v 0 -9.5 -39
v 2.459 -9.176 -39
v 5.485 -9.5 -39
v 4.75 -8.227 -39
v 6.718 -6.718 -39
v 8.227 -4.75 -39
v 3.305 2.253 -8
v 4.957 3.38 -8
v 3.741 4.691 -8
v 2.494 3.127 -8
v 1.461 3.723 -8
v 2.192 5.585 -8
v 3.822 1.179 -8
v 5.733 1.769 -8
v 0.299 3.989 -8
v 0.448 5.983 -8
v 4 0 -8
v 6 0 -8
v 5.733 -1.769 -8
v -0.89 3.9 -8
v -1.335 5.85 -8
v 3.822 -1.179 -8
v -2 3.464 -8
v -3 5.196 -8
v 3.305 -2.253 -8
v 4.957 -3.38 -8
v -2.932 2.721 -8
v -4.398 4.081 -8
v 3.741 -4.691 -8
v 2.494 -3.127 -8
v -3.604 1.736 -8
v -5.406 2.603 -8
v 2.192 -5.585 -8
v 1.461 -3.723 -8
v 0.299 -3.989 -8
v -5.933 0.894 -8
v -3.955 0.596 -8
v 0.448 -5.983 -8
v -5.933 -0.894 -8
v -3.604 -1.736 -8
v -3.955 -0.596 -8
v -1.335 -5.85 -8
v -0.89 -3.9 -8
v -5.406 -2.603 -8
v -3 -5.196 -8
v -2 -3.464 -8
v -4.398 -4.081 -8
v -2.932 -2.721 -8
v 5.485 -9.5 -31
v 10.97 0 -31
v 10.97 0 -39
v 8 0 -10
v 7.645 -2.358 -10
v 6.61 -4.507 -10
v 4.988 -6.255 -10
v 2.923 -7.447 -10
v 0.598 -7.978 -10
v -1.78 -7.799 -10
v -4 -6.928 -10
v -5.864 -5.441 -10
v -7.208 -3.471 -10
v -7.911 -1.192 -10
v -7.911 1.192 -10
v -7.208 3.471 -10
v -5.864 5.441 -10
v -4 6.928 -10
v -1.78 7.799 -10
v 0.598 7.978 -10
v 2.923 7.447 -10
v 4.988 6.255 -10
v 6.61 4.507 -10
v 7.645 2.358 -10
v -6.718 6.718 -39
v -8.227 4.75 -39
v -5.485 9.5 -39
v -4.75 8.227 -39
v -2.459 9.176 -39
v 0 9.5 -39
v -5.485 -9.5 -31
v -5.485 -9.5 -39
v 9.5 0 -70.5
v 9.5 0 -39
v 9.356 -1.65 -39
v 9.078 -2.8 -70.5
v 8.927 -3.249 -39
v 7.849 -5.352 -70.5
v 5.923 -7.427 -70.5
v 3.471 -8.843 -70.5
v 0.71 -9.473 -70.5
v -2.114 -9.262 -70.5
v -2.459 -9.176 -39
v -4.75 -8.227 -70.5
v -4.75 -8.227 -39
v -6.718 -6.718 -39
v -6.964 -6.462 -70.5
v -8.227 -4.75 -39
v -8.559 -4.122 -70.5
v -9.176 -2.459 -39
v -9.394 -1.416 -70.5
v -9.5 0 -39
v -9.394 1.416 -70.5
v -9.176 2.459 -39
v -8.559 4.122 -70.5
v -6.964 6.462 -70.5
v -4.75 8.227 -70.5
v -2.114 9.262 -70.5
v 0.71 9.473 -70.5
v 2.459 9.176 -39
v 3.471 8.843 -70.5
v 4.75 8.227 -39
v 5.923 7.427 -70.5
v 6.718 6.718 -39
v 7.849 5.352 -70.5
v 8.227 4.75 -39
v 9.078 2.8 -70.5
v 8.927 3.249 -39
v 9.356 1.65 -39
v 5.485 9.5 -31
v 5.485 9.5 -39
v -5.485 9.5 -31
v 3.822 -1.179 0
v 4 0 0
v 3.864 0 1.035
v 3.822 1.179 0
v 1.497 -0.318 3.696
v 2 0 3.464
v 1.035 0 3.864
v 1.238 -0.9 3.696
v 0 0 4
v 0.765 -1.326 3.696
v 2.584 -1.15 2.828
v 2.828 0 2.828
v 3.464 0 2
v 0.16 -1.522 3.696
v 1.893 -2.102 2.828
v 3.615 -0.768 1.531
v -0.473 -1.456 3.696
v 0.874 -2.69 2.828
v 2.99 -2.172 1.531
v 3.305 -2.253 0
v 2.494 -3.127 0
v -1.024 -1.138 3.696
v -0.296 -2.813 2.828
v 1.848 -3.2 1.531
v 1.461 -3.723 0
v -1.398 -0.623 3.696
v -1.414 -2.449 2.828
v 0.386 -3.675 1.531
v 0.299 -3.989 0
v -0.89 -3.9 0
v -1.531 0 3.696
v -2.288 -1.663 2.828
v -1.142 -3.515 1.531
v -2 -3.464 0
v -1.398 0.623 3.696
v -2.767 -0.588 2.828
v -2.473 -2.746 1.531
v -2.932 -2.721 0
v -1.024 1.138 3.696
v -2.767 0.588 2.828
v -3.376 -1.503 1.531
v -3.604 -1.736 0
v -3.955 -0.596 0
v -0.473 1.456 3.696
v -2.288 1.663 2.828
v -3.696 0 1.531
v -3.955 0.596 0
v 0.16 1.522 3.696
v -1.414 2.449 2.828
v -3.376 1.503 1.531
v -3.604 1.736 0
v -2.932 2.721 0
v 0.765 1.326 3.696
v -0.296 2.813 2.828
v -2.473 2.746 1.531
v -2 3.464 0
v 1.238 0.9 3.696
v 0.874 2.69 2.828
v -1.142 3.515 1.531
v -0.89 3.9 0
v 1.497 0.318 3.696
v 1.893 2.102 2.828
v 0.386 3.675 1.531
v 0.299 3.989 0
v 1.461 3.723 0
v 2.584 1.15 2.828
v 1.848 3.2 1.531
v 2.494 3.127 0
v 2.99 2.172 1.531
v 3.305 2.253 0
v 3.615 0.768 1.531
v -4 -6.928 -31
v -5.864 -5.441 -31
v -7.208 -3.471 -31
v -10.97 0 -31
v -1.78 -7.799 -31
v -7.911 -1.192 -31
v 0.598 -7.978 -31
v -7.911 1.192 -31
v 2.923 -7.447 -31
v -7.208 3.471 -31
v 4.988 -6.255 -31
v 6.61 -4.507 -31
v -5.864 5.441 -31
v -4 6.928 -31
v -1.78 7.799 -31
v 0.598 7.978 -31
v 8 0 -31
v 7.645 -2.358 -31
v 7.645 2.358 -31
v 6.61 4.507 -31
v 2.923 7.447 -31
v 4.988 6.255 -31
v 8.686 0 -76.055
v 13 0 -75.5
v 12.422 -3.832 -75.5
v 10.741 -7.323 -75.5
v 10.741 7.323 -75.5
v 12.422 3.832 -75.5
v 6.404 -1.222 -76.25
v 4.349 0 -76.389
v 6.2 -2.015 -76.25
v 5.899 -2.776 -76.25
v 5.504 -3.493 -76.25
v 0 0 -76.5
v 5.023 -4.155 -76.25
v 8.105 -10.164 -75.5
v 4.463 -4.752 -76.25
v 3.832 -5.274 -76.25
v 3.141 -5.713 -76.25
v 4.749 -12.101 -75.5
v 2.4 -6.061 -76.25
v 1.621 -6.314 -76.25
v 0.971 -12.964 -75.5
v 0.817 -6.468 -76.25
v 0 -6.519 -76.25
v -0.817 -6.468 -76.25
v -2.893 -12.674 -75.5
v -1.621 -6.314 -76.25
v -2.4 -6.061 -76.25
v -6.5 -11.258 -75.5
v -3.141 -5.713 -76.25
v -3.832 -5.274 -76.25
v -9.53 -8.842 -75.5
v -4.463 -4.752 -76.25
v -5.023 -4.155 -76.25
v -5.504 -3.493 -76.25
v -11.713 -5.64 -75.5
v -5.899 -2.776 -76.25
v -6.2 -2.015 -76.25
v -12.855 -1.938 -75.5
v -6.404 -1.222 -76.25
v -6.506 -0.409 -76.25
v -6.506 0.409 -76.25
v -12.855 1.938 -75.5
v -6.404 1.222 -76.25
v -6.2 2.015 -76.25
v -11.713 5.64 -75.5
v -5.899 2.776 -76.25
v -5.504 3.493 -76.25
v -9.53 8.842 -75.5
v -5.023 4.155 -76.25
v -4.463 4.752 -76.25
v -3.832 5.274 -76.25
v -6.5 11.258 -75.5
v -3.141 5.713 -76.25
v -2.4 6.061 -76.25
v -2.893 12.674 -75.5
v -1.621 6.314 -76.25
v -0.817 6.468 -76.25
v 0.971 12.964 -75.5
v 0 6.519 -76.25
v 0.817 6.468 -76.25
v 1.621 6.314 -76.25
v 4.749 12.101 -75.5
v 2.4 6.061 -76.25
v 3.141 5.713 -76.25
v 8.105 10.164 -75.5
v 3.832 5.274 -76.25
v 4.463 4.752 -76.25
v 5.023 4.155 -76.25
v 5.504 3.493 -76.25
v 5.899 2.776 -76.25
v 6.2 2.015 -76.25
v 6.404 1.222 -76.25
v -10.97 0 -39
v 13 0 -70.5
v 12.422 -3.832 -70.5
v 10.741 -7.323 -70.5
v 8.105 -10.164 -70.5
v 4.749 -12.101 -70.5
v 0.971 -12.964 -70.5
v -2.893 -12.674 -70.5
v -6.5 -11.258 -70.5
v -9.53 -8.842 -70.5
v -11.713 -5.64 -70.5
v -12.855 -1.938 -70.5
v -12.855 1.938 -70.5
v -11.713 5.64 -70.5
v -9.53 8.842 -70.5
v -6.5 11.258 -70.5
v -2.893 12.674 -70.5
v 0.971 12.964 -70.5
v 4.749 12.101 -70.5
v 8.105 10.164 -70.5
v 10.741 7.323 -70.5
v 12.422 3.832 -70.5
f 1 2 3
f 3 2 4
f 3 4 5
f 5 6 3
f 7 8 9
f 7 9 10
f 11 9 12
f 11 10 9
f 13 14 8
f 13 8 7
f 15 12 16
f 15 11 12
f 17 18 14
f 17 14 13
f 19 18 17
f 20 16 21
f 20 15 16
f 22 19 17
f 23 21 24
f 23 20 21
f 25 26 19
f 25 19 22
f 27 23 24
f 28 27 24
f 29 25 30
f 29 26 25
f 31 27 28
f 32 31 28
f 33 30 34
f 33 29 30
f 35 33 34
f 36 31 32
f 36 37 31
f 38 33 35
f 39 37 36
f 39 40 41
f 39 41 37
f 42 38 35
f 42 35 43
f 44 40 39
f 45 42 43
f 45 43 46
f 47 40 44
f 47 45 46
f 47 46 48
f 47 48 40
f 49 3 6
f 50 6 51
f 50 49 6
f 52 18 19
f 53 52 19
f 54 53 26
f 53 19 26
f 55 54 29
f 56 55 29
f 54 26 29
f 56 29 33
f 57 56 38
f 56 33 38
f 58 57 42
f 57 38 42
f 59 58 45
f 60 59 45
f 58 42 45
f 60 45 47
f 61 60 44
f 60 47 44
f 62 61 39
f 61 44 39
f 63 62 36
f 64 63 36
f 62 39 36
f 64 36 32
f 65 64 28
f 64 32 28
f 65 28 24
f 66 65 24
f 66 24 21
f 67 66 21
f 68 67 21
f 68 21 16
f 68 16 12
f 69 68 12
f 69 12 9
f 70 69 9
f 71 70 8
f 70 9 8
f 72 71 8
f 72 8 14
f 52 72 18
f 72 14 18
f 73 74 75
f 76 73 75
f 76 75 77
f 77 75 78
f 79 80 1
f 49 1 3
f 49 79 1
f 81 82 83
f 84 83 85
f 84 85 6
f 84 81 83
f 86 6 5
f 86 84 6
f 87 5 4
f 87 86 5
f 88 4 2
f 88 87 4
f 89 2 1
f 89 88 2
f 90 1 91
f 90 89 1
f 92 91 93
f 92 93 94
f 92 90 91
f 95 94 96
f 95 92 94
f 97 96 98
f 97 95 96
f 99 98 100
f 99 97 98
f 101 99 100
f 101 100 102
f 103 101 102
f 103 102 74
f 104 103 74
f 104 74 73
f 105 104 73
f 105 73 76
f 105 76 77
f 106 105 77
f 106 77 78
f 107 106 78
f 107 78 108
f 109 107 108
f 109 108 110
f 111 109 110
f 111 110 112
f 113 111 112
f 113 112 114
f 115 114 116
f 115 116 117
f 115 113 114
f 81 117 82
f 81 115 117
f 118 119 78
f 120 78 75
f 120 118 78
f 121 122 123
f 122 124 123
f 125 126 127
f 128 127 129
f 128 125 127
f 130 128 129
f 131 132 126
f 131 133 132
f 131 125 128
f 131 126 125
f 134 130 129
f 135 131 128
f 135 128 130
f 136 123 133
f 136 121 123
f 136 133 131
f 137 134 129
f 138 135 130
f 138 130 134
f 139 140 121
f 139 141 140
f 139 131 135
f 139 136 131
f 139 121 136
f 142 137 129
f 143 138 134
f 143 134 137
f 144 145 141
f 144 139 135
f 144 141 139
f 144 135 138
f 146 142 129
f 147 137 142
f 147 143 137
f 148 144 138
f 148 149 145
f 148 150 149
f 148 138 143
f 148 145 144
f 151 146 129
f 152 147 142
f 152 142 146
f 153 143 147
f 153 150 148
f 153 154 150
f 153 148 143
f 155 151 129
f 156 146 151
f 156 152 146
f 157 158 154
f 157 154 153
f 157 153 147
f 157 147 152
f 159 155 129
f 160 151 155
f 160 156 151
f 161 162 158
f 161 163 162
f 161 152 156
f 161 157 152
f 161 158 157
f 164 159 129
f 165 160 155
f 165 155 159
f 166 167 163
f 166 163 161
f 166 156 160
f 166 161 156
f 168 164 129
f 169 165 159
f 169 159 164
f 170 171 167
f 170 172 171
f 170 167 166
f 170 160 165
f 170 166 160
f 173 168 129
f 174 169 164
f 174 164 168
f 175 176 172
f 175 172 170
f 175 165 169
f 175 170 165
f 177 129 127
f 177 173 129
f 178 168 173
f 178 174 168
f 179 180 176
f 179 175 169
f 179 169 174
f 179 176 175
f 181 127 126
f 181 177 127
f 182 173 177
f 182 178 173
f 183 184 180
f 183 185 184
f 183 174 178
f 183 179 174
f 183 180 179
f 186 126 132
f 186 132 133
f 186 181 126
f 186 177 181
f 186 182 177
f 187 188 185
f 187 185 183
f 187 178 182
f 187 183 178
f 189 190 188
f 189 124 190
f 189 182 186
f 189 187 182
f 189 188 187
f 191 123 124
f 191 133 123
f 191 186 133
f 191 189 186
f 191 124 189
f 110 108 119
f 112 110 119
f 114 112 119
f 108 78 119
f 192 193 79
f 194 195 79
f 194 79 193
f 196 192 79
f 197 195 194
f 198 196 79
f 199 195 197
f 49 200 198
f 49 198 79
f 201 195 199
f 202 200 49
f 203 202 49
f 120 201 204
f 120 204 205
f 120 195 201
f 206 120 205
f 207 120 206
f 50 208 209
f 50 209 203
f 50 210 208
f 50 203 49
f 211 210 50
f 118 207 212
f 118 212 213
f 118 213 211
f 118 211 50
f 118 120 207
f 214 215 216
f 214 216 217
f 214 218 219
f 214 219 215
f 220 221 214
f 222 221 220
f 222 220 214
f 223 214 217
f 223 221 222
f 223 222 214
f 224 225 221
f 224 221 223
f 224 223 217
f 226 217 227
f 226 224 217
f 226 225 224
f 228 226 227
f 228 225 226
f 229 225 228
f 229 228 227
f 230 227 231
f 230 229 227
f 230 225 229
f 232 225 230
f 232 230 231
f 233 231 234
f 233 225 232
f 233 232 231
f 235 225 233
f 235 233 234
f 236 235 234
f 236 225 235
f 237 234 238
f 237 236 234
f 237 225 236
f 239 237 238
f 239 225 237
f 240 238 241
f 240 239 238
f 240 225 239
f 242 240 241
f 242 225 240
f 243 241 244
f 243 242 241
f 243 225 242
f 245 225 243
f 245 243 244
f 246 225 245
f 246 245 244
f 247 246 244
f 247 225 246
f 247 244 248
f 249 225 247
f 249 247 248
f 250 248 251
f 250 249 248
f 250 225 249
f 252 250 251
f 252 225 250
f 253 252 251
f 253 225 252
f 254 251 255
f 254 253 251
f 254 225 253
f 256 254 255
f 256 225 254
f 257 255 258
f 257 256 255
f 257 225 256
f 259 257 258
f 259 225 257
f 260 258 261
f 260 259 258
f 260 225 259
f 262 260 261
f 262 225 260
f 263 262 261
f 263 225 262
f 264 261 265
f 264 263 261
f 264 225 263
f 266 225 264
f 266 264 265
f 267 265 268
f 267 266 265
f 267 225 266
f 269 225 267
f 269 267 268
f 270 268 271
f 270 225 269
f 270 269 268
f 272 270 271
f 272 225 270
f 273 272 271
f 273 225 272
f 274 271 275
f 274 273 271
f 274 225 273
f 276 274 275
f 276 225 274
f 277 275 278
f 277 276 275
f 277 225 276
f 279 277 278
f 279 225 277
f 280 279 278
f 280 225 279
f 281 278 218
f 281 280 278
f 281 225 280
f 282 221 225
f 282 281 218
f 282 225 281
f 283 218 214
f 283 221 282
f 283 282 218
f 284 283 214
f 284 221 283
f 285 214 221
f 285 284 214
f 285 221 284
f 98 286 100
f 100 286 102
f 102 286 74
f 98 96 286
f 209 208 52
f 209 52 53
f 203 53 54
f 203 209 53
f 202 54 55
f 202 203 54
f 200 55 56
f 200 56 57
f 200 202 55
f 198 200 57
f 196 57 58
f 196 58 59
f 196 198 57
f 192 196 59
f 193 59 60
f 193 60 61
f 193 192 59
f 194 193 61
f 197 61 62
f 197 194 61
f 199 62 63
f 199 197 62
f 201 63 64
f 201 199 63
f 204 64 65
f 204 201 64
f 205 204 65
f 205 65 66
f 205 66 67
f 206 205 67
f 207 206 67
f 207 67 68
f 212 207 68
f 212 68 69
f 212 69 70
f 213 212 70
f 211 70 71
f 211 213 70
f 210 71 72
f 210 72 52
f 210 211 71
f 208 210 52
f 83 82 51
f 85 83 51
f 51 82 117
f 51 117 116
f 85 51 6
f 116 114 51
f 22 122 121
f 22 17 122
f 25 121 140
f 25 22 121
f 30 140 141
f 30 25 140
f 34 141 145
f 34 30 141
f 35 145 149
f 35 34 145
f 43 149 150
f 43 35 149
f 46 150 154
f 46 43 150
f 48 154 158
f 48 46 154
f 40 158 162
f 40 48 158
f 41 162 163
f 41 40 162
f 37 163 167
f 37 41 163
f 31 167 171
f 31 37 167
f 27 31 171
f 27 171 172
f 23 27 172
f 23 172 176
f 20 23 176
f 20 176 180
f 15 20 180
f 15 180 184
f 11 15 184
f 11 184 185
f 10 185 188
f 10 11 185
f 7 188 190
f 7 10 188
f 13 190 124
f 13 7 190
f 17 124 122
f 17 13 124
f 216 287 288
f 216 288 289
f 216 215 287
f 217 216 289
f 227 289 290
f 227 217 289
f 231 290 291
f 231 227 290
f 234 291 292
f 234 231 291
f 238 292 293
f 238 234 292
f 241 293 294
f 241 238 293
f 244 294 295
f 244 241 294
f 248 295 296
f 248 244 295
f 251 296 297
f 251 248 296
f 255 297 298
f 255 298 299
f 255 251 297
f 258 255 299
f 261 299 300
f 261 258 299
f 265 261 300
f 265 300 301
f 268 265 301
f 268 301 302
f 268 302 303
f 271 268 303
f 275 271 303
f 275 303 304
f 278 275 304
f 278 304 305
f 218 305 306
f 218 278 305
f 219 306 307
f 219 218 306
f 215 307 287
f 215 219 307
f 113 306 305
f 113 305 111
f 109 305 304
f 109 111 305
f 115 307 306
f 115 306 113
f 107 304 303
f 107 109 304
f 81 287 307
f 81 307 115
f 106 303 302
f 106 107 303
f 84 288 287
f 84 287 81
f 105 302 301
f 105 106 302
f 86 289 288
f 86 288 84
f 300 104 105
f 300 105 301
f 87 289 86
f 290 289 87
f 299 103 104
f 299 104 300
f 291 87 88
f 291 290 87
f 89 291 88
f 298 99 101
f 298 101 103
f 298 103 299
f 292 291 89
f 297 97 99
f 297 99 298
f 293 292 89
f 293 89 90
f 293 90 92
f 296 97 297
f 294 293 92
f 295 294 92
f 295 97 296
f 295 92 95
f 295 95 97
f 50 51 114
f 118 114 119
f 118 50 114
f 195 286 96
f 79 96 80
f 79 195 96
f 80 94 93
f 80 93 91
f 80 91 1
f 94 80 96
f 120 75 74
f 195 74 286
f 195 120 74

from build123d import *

# Parameters (mm, degrees)
EXTRUDE_1_DEPTH = 8
CHAMFER_1_SIZE  = 2


with BuildPart() as part:
    # 草图1 → 旋转1 (revolve)
    with BuildSketch(Plane(origin=(0, 0, 0), x_dir=(1, 0, 0), z_dir=(0, 1, 0))):
        with BuildLine():
            Line((4, 0), (4, 8))
            Line((4, 8), (8, 8))
            Line((8, 8), (8, 31))
            Line((8, 31), (9.5, 31))
            Line((9.5, 31), (9.5, 70.5))
            Line((9.5, 70.5), (13, 70.5))
            Line((13, 70.5), (13, 75.5))
            ThreePointArc((13, 75.5), (6.519202405, 76.249631268), (0, 76.5))
            Line((0, 76.5), (0, -4))
            ThreePointArc((0, -4), (2.828427125, -2.828427125), (4, 0))
        make_face()
    revolve(axis=Axis((0, 0, 0), (0, 0, -1)))

    # 草图2 → 凸台-拉伸1 (add)
    with BuildSketch(Plane.XY.offset(-31)):
        Polygon((10.969655115, 0), (5.484827557, 9.5), (-5.484827557, 9.5), (-10.969655115, 0), (-5.484827557, -9.5), (5.484827557, -9.5), align=None)
    extrude(amount=-EXTRUDE_1_DEPTH)

    # 倒角1
    chamfer_1_edges = [part.edges().sort_by_distance(p)[0] for p in [
        (-8, 0, -8),
    ]]
    chamfer(chamfer_1_edges, length=CHAMFER_1_SIZE)


solid = part.part
